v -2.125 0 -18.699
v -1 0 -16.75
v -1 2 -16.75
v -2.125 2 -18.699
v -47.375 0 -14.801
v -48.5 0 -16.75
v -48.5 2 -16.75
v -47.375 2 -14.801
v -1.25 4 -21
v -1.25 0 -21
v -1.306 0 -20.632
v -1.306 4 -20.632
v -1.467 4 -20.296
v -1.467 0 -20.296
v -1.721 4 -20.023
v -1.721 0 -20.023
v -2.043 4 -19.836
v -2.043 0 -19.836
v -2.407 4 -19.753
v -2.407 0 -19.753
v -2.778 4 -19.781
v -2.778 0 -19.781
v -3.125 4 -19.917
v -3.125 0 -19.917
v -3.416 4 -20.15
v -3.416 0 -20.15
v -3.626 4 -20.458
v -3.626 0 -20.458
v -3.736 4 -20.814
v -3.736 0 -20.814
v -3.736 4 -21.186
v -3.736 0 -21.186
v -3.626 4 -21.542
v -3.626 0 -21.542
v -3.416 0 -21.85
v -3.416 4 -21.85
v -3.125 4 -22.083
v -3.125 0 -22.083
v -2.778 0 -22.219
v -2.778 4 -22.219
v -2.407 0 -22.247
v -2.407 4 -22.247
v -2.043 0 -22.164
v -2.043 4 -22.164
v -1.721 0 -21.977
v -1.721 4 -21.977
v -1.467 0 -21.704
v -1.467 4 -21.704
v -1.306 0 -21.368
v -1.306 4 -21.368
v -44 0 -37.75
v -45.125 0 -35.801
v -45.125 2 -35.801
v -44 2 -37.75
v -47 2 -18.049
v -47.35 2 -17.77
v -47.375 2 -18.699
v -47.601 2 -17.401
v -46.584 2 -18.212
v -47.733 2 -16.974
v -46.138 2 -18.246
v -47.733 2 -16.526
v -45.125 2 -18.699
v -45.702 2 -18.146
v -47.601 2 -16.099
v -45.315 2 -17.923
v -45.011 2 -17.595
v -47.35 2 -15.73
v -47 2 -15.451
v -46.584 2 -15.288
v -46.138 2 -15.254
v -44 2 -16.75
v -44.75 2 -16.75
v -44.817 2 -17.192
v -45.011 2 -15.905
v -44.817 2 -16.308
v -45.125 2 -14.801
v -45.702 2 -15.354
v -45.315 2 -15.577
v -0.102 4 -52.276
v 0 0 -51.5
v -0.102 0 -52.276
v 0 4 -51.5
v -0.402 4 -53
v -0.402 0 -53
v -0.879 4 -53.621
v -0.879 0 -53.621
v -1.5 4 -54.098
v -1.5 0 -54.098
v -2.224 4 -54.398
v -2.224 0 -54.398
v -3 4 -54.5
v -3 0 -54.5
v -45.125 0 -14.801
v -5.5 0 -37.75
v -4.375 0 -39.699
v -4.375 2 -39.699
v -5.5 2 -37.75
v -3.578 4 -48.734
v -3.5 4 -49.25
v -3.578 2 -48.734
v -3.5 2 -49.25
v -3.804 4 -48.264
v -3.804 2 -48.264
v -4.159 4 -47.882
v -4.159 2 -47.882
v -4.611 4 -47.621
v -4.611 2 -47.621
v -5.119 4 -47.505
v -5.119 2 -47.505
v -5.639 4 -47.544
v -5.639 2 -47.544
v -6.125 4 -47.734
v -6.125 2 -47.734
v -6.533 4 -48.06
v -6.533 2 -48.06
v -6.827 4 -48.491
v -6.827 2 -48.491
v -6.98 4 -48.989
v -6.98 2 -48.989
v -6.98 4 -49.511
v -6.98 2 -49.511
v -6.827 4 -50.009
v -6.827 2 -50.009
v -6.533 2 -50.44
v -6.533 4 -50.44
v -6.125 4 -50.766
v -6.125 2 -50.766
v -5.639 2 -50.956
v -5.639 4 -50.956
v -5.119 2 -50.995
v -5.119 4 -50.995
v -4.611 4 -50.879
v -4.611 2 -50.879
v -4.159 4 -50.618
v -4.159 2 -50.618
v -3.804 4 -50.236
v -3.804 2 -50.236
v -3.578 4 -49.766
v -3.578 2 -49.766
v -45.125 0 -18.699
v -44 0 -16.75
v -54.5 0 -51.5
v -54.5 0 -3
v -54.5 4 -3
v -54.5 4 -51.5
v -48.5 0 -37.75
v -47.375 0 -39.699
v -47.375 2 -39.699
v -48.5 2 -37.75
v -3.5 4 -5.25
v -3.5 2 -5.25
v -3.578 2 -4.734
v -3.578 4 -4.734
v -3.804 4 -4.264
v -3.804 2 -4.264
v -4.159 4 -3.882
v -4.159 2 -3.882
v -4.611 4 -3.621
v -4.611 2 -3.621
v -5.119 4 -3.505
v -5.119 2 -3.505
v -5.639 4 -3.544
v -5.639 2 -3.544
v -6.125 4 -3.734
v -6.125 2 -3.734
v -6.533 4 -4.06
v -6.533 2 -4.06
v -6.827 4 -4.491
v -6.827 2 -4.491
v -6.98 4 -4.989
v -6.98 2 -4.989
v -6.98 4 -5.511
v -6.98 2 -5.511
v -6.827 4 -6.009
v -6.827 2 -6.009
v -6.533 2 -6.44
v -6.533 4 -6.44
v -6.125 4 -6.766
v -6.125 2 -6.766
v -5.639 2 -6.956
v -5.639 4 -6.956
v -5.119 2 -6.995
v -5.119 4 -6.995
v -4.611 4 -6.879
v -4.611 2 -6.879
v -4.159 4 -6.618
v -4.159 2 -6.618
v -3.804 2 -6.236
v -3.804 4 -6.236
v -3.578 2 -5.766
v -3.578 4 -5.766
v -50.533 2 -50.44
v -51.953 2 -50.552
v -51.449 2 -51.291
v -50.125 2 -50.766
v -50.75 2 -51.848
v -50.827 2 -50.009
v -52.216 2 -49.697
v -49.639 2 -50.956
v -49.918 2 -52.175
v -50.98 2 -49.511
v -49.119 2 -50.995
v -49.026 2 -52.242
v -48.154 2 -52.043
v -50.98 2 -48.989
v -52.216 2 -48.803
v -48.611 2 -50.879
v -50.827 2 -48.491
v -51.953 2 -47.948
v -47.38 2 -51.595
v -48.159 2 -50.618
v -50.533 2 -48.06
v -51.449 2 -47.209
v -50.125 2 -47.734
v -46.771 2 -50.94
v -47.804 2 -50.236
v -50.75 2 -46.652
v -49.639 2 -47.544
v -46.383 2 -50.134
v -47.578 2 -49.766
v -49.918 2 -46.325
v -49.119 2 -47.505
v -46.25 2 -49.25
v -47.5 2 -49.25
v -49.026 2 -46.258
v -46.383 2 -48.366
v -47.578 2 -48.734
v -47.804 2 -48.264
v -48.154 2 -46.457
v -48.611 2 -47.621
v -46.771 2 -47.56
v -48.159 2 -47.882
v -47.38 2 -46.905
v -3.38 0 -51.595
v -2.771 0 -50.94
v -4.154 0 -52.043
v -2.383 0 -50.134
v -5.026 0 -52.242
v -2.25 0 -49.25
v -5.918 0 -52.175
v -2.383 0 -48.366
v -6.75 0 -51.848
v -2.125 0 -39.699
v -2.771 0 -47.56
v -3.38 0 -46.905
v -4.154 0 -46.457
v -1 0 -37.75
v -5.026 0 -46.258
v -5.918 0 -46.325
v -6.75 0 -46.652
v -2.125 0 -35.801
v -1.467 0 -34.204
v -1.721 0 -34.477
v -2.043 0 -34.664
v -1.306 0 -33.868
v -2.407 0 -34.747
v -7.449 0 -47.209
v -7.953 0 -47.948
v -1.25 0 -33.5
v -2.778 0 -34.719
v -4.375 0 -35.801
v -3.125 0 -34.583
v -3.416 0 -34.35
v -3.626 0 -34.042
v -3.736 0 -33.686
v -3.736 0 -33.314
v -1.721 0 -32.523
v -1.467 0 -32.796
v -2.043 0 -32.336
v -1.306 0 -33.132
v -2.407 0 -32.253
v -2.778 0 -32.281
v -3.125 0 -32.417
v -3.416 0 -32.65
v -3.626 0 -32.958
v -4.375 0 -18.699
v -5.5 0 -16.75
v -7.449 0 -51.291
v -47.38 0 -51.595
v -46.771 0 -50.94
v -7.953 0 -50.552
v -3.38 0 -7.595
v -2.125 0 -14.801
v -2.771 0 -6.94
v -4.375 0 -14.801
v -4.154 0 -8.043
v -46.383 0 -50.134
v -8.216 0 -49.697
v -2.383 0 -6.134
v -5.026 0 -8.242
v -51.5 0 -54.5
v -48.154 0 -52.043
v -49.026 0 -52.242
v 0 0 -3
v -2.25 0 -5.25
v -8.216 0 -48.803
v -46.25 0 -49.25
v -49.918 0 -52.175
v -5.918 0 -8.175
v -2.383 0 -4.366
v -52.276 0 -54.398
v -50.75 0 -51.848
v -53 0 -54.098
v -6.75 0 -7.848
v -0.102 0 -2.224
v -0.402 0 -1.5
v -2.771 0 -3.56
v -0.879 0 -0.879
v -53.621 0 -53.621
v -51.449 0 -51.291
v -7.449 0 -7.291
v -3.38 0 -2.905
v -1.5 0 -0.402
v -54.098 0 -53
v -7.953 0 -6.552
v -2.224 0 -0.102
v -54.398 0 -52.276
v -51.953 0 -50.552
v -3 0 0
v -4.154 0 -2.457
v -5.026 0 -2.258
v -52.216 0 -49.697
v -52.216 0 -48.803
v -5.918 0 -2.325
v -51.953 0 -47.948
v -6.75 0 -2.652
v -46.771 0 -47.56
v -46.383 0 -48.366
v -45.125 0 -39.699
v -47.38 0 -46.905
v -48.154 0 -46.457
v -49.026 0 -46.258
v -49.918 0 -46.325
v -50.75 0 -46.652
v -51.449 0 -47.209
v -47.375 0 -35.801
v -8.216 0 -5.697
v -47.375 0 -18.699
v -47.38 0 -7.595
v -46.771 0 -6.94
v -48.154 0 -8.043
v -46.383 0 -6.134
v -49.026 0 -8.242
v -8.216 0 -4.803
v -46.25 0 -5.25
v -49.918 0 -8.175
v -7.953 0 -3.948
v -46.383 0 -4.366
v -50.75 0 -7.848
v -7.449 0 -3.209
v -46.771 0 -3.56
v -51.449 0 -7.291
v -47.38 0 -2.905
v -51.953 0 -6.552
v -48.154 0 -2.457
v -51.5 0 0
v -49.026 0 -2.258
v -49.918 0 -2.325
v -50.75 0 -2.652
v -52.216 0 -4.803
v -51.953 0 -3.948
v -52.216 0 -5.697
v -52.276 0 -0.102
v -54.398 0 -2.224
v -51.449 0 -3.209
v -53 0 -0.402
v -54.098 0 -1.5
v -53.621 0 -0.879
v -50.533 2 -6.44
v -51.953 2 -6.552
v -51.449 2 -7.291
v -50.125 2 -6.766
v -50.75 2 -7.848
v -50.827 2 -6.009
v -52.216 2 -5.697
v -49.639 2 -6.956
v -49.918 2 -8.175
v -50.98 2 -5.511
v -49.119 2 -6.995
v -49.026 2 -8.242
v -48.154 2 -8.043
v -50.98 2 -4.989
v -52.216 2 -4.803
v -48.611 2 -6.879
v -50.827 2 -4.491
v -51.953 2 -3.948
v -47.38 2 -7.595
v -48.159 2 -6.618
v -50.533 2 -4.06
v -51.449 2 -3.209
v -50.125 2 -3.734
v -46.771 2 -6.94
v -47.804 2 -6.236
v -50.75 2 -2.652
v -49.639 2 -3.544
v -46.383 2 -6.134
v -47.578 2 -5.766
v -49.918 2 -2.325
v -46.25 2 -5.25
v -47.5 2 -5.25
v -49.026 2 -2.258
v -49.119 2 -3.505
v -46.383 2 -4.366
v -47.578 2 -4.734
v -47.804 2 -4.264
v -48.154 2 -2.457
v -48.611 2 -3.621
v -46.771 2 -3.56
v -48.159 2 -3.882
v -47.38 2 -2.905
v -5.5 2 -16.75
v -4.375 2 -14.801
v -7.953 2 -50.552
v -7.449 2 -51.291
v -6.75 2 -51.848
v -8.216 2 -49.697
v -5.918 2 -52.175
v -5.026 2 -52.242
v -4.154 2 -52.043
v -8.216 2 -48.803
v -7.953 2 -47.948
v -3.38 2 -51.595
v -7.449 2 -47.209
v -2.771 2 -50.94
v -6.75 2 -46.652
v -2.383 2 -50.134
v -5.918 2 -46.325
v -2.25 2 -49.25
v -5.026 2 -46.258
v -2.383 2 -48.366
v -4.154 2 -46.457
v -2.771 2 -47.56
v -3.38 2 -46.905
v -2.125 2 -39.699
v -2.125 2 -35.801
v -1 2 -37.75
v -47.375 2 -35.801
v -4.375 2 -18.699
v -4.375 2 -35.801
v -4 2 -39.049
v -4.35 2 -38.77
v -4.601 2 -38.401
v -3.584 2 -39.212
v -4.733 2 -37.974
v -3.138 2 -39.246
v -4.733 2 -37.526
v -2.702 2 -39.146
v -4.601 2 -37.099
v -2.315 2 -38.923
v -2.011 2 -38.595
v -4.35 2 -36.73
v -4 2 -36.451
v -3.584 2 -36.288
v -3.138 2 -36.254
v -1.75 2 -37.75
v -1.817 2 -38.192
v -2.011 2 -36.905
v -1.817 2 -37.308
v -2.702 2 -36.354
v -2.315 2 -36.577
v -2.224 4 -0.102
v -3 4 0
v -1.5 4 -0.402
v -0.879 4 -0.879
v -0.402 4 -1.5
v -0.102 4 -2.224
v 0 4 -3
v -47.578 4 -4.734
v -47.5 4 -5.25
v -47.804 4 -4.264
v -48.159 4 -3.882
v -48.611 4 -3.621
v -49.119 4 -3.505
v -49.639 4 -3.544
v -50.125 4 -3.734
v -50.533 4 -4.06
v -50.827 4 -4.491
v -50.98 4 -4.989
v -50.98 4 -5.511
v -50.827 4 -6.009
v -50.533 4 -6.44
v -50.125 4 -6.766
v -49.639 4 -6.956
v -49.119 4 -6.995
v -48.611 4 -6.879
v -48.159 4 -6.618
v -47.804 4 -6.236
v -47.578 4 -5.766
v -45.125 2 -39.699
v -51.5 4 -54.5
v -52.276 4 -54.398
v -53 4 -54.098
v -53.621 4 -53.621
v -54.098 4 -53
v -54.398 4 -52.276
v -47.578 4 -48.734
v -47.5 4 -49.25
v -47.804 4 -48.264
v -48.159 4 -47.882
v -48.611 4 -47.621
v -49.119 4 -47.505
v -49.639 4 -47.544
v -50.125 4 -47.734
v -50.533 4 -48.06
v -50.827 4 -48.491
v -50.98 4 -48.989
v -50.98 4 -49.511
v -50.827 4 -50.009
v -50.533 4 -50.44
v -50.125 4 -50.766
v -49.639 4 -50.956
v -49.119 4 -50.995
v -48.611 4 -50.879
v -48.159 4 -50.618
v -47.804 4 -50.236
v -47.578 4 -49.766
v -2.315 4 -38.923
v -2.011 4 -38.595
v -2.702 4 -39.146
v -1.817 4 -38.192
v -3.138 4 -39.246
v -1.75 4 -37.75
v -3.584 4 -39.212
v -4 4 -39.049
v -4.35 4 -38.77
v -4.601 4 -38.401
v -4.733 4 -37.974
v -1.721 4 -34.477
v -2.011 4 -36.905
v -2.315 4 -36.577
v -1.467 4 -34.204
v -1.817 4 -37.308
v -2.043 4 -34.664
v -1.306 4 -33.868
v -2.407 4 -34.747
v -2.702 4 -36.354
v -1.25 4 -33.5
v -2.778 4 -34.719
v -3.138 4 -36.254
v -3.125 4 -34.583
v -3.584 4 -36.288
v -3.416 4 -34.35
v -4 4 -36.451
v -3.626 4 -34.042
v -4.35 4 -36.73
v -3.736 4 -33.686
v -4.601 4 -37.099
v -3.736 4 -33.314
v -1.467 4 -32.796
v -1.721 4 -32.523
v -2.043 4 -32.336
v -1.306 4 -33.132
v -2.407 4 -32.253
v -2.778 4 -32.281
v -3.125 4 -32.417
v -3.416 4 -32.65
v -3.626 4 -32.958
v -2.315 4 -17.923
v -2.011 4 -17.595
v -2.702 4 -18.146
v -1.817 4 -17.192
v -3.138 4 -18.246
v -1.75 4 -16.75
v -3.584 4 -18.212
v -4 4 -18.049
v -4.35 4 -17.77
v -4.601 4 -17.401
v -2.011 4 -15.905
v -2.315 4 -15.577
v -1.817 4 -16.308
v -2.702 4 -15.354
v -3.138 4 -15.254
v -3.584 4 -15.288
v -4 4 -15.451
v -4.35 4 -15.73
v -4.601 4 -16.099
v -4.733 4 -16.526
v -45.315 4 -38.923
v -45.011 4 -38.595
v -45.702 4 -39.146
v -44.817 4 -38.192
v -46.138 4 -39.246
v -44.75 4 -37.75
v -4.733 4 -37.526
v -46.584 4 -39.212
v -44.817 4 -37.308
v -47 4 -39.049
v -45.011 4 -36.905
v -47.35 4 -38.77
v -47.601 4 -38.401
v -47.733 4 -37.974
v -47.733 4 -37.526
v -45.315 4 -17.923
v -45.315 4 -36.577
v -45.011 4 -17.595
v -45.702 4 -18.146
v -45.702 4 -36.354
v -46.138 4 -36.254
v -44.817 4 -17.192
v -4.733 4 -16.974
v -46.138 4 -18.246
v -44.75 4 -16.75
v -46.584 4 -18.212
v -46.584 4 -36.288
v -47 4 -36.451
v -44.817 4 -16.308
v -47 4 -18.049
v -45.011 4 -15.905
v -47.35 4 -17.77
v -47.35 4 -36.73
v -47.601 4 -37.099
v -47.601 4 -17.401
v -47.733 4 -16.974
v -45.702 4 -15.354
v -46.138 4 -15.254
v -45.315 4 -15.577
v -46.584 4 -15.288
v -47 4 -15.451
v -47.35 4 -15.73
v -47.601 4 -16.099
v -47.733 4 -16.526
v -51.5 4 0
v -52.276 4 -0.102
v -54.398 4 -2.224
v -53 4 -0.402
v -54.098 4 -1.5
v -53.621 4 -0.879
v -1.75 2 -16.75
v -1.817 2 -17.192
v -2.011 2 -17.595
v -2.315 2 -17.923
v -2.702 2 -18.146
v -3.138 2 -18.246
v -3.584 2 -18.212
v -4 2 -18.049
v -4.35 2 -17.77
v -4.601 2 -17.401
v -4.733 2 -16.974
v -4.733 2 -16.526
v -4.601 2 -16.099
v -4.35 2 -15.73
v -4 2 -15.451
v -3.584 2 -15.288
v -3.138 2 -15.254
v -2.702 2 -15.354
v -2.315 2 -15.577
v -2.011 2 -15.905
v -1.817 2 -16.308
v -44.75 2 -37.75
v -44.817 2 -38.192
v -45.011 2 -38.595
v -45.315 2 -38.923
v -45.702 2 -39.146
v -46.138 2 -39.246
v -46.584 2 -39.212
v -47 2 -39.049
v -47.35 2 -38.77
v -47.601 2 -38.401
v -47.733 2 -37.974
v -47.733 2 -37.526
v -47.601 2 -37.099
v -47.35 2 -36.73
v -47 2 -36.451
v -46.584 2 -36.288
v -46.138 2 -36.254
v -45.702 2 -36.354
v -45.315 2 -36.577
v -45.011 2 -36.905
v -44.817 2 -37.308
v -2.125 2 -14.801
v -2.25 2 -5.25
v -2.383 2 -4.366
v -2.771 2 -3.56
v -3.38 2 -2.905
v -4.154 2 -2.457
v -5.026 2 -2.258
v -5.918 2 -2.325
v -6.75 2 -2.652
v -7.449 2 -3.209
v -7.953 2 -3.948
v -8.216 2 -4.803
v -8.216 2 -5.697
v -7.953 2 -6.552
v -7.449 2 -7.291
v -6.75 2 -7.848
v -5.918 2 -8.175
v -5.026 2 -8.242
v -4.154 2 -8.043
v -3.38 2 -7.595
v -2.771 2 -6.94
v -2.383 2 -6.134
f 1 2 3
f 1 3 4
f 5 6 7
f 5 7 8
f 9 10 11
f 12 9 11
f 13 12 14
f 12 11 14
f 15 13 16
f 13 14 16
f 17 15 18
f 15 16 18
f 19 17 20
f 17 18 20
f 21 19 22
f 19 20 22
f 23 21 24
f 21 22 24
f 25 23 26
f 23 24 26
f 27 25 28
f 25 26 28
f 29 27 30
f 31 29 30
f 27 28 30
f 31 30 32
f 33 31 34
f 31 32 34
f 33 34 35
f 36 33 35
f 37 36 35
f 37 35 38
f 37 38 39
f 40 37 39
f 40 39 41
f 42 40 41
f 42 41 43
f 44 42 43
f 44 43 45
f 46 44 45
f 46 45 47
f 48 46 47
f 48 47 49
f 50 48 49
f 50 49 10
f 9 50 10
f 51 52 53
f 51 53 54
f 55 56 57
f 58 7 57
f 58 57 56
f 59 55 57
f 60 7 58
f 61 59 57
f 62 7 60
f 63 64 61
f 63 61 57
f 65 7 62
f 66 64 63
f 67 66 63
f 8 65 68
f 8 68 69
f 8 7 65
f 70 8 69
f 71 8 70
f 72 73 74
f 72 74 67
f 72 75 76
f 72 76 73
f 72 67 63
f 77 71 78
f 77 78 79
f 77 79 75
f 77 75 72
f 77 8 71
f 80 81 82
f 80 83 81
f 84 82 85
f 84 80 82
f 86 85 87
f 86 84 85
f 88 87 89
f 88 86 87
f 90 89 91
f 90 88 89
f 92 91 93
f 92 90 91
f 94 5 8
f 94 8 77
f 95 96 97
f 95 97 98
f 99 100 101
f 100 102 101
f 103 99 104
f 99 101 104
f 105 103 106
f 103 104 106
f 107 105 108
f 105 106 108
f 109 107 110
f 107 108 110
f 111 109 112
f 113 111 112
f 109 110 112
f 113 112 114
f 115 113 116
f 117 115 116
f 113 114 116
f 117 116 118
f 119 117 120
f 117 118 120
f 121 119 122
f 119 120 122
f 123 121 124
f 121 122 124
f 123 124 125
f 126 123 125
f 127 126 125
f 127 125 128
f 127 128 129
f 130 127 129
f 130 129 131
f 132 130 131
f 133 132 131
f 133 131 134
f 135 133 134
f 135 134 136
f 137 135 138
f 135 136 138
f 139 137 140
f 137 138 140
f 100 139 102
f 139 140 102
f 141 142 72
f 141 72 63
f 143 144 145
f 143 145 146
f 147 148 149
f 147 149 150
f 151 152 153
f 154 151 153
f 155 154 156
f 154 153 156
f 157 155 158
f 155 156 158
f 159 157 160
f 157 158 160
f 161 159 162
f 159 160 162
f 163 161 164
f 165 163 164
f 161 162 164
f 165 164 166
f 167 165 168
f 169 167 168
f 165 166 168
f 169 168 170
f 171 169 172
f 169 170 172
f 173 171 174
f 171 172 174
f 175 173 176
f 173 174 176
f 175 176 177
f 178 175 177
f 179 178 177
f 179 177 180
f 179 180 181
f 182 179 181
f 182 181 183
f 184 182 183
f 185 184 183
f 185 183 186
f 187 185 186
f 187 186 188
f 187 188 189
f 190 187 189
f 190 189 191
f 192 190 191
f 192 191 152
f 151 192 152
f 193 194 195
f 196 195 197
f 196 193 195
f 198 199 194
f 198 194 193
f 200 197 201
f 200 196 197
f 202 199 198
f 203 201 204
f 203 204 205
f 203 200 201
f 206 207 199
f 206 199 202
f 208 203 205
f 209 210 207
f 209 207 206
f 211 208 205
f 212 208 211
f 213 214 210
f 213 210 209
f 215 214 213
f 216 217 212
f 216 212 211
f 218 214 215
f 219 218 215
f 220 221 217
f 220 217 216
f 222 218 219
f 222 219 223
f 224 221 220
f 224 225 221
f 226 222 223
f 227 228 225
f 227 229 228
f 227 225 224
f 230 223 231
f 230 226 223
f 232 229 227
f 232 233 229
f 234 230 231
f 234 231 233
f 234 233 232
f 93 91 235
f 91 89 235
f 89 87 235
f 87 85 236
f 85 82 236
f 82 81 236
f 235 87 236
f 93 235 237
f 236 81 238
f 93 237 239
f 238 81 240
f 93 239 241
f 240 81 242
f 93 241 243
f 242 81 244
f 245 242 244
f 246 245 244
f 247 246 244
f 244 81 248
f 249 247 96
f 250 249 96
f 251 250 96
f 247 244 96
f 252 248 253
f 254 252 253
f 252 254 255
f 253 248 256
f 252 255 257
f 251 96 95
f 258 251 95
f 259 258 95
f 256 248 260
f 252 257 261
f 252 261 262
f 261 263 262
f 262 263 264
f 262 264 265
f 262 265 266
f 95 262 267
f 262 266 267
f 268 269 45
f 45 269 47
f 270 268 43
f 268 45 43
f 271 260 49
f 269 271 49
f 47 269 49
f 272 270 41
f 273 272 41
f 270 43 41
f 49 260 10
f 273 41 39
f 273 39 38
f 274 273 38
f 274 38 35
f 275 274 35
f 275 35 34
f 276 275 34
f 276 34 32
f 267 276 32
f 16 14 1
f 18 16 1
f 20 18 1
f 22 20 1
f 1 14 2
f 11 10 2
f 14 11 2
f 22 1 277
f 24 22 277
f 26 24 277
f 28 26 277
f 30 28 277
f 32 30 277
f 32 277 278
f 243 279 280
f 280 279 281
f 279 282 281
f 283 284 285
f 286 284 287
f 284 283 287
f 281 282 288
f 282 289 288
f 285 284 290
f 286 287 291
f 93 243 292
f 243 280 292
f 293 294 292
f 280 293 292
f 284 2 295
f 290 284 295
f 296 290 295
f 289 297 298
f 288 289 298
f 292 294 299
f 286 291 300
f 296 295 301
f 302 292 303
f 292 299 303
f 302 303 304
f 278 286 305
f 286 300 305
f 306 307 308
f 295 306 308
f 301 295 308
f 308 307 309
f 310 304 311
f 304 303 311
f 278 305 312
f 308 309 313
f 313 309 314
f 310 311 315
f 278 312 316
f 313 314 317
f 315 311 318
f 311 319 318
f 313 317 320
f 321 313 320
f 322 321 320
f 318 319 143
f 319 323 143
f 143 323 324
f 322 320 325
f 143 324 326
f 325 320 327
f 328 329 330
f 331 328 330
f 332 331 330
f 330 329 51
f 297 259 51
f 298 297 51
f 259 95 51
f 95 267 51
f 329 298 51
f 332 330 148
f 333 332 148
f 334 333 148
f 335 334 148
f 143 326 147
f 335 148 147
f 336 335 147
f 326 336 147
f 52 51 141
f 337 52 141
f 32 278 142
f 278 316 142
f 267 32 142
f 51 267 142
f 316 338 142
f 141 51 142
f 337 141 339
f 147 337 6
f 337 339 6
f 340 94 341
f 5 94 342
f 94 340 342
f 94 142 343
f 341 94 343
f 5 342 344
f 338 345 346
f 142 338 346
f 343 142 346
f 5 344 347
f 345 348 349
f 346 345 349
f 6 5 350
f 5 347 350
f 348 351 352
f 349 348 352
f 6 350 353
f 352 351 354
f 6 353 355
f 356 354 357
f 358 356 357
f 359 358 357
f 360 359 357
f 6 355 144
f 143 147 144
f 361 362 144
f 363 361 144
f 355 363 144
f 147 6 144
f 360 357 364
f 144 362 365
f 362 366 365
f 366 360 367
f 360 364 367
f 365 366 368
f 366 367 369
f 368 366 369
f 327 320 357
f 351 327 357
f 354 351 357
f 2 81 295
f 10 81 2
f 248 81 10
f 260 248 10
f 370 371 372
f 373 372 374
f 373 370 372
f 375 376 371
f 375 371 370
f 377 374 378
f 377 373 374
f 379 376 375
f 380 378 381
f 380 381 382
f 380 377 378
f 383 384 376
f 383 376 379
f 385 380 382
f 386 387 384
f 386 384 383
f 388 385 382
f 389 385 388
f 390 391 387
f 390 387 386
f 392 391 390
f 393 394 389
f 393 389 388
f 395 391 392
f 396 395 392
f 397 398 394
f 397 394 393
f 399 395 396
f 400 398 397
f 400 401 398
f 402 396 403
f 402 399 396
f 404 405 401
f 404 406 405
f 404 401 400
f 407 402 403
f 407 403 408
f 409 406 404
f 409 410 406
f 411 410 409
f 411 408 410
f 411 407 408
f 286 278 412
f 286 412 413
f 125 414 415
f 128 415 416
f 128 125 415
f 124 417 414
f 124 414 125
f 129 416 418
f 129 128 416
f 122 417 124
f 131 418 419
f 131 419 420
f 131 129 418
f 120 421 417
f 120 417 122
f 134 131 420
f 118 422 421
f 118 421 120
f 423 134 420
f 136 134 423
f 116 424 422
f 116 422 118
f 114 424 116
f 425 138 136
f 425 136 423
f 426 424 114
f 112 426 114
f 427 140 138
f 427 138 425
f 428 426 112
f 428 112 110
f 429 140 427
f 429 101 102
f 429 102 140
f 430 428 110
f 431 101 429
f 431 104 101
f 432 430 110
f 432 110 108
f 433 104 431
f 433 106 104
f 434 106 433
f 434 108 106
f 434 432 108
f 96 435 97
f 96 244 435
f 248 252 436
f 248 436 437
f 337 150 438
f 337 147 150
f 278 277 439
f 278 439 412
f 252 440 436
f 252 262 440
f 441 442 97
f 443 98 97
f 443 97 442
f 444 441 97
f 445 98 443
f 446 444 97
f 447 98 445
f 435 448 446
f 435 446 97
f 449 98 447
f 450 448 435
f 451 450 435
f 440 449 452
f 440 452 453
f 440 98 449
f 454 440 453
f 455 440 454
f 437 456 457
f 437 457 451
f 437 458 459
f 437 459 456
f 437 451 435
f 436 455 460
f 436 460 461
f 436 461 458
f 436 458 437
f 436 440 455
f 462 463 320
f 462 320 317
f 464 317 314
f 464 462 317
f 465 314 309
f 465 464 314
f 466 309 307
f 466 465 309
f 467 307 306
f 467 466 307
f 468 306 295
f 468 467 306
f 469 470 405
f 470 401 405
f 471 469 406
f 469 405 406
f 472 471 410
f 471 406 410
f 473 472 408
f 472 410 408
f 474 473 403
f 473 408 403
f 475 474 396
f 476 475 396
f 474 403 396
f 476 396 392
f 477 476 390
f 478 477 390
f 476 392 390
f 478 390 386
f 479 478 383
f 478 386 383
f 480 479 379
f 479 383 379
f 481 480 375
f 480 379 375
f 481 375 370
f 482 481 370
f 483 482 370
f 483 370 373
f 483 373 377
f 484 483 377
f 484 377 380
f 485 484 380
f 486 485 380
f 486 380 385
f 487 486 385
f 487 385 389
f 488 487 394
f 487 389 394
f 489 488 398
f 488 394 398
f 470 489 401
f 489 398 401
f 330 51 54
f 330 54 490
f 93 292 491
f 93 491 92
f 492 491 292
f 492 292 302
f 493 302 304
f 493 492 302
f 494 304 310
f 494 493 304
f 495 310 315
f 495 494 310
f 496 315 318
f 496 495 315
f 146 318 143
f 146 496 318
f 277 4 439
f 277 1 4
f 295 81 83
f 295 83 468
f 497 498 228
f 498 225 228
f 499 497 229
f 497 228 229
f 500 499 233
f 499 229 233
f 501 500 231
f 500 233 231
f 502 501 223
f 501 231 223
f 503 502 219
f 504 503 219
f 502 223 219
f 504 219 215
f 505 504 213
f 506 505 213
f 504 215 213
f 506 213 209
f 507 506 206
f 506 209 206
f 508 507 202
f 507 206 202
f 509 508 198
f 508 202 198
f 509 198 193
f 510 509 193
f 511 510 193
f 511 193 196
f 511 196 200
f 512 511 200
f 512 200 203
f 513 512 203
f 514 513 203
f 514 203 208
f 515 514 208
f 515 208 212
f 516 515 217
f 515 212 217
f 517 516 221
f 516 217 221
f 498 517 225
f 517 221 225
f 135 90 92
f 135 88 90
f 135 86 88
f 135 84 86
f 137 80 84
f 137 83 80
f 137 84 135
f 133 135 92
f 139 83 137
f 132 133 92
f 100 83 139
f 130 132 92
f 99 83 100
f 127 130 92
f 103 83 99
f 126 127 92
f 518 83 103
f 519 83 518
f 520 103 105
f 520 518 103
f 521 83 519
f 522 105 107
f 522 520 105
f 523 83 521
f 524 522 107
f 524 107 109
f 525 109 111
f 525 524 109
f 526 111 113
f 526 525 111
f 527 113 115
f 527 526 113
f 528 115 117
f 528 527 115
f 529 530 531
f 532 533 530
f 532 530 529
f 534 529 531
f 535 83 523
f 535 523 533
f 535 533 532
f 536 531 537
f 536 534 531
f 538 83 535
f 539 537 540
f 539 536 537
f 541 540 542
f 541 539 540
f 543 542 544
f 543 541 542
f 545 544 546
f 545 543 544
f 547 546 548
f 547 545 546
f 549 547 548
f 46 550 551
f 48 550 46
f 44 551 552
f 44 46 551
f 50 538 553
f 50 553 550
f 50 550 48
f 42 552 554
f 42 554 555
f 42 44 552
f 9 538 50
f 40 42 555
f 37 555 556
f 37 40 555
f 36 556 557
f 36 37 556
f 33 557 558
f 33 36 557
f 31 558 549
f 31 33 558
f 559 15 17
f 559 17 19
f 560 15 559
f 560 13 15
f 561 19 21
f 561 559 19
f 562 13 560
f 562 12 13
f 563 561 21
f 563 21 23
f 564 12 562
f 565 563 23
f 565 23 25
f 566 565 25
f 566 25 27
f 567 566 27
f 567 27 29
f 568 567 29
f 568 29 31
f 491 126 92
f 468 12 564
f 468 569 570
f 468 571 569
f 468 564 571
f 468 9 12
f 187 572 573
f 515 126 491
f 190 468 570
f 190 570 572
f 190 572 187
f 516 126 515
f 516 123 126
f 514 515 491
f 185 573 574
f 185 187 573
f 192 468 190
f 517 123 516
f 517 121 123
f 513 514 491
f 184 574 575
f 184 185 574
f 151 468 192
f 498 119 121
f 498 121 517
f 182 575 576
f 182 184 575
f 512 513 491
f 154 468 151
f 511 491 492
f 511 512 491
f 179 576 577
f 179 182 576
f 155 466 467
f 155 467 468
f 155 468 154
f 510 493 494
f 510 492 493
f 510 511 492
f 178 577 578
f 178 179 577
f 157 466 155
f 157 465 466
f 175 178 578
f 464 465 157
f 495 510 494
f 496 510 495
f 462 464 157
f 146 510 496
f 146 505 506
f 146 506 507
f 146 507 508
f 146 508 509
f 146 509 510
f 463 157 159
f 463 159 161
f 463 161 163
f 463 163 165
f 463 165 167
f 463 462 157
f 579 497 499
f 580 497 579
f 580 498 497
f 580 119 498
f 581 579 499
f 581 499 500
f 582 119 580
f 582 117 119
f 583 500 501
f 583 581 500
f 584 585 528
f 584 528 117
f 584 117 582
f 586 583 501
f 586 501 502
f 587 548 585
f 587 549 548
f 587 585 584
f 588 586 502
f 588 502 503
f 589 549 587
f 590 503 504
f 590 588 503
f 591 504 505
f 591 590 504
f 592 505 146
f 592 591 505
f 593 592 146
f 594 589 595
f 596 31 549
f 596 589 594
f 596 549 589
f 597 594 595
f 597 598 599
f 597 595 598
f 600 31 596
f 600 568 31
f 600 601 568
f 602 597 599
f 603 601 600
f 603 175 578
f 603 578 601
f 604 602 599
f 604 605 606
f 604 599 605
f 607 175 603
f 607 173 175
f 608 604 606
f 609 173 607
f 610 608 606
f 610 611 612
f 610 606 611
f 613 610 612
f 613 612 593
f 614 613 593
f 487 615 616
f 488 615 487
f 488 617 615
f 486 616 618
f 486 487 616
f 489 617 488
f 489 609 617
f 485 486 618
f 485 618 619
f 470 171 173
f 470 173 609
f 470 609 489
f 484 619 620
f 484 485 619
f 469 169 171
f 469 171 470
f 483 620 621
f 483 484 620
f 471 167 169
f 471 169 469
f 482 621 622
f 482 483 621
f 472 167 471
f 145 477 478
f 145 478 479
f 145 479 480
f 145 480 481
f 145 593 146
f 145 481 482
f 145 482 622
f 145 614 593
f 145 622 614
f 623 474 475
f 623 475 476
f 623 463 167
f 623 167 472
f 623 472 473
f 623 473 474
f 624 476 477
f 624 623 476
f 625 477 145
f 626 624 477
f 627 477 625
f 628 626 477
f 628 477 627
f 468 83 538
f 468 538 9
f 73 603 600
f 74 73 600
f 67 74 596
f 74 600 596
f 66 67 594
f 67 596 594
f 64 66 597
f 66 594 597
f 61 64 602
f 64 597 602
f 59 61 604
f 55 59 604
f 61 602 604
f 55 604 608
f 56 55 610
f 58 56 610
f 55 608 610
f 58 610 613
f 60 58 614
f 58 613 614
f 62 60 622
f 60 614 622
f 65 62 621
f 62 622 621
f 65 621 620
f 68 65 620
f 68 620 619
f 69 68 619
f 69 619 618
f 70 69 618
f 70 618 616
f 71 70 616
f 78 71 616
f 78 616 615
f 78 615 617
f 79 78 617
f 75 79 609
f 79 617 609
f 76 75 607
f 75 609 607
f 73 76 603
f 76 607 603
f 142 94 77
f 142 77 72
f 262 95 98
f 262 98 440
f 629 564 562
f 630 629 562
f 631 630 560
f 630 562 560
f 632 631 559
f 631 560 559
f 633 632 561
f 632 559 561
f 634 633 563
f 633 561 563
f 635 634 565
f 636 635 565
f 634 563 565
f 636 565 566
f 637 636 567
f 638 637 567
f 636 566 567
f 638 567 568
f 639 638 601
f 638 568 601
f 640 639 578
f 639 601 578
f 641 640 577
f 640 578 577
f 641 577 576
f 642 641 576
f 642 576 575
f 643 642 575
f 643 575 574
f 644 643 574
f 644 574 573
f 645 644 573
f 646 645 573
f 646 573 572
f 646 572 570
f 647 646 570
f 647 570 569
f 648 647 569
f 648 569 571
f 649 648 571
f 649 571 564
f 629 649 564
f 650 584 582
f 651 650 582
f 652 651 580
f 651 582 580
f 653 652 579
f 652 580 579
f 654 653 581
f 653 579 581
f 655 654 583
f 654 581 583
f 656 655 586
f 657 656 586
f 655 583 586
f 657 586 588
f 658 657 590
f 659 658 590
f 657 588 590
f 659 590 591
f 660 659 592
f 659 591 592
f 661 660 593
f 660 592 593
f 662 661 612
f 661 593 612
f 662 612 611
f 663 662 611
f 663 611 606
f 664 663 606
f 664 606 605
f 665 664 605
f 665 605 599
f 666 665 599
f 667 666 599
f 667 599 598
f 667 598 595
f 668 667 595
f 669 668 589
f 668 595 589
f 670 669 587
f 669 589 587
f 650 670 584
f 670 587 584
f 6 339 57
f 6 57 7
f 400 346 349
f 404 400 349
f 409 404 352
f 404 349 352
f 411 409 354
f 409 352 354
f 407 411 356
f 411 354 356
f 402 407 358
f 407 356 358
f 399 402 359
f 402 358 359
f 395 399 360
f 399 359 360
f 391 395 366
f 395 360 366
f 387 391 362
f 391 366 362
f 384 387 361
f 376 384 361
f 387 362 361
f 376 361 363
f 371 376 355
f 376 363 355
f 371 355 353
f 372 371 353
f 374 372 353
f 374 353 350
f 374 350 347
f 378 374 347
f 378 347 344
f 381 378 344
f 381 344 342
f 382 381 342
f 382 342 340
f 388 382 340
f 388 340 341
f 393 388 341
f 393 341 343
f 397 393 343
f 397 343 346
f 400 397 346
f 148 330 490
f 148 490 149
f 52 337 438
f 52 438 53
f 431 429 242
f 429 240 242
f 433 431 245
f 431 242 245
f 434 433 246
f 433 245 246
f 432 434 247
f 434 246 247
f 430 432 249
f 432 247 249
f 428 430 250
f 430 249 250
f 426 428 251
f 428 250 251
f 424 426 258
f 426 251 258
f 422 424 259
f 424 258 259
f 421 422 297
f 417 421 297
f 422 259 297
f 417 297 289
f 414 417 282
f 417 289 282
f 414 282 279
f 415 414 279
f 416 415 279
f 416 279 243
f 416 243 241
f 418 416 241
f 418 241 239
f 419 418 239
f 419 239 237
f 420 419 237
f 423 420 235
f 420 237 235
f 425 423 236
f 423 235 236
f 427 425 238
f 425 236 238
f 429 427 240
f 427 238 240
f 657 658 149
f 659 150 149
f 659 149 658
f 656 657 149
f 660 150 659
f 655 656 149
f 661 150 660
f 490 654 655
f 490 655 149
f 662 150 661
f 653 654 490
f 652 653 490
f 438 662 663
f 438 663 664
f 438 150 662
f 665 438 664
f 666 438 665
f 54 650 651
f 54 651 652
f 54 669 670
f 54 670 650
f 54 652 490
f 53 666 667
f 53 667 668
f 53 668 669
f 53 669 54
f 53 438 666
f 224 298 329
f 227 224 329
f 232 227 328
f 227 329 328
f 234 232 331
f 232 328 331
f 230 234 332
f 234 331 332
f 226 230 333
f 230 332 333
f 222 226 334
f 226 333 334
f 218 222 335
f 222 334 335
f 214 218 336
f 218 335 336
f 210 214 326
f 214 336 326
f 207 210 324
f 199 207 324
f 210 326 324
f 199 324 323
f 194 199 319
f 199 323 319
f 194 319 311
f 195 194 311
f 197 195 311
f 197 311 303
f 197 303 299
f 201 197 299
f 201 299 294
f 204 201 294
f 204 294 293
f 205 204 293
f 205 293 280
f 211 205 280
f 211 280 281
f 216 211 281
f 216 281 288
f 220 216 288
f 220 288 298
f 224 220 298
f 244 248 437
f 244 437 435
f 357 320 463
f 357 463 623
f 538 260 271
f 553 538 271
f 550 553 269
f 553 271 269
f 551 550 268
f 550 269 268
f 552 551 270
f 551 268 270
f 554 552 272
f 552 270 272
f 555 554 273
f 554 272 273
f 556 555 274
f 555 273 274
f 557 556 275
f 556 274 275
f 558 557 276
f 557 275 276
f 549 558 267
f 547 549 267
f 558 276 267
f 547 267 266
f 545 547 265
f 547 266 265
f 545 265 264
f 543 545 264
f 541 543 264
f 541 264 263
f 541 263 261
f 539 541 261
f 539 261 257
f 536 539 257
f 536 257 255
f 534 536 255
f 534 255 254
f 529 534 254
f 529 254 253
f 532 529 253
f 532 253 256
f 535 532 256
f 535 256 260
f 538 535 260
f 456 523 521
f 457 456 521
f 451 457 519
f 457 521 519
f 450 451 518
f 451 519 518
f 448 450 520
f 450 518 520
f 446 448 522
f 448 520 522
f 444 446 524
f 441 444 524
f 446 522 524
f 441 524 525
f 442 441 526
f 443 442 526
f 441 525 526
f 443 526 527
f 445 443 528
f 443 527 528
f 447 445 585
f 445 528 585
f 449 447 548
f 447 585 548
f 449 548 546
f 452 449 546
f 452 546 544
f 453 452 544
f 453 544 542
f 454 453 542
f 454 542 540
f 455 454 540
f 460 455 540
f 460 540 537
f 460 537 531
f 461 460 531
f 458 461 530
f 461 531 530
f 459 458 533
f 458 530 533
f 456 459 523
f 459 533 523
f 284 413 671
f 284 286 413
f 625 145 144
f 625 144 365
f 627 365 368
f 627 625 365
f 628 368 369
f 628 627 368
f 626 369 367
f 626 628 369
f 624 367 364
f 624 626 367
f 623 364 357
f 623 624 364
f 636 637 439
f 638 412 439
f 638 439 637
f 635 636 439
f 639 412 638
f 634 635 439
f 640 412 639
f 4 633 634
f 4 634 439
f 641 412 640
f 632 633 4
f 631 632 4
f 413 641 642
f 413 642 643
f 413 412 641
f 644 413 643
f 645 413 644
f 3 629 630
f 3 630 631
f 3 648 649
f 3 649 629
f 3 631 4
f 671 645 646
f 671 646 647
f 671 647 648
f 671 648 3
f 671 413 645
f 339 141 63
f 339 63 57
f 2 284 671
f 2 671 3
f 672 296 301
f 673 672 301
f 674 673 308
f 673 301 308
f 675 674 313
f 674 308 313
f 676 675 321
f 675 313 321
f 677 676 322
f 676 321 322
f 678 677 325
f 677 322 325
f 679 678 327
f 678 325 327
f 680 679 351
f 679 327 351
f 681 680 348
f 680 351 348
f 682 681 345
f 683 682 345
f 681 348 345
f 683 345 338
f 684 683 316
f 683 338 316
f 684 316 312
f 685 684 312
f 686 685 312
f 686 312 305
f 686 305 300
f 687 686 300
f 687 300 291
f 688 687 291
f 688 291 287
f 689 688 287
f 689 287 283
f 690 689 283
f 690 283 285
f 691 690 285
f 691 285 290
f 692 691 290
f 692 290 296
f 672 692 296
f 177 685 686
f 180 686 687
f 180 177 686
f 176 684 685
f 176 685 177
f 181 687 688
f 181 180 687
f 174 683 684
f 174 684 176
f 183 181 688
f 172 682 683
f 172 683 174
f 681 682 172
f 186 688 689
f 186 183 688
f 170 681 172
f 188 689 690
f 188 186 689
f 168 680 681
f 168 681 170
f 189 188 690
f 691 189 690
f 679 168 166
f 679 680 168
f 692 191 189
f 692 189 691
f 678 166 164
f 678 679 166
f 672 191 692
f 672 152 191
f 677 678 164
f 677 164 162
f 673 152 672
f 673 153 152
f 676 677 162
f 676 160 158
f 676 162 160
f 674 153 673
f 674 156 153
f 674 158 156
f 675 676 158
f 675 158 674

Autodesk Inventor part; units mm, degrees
ref_plane "YZ Plane" through (0, 0, 0) normal (1, 0, 0) x (0, 1, 0)
ref_plane "XZ Plane" through (0, 0, 0) normal (0, 1, 0) x (-1, 0, 0)
ref_plane "XY Plane" through (0, 0, 0) normal (0, 0, 1) x (1, 0, 0)
sketch "Эскиз1" plane through (0, 0, 0) normal (0, 1, 0) x (-1, 0, 0)
  line L0 (0, 0) -> (54.5, 0)
  line L1 (54.5, 0) -> (54.5, -54.5)
  line L2 (54.5, -54.5) -> (0, -54.5)
  line L3 (0, -54.5) -> (0, 0)
  dimension "d0" = 54.5
  dimension "d1" = 54.5
extrude "Выдавливание1" add sketch "Эскиз1" along normal blind 4
fillet "Сопряжение1" radius 3 4 edges at (0, 2, 0) (0, 2, -54.5) (-54.5, 2, -54.5) (-54.5, 2, 0)
sketch "Эскиз2" plane through (0, 0, 0) normal (0, -1, 0) x (1, 0, 0)
  arc A0 (-54.5, -51.5) -> (-51.5, -54.5) centre (-51.5, -51.5) ccw projected
  line L0 (-54.5, -51.5) -> (-54.5, -3) projected
  line L1 (-54.5, -27.25) -> (0, -27.25) construction
  line L2 (0, -3) -> (0, -51.5) projected
  line L3 (-3, -54.5) -> (-51.5, -54.5) projected
  line L4 (-27.25, -54.5) -> (-27.25, 0) construction
  line L5 (-51.5, 0) -> (-3, 0) projected
  line L6 (-54.5, -51.5) -> (-54.5, -3) projected
  circle A1 centre (-49.25, -49.25) radius 3
  circle A2 centre (-49.25, -5.25) radius 3
  circle A3 centre (-5.25, -49.25) radius 3
  circle A4 centre (-5.25, -5.25) radius 3
  point P0 (0, 0)
  dimension "d13" = 6
  dimension "d34" = 44
  dimension "d35" = 44
extrude "Выдавливание2" cut sketch "Эскиз2" against normal blind 2
sketch "Эскиз3" plane through (0, 2, 0) normal (0, -1, 0) x (1, 0, 0)
  circle A0 centre (-49.25, -49.25) radius 1.75
  line L0 (-54.5, -51.5) -> (-54.5, -3) projected
  line L1 (-54.5, -27.25) -> (0, -27.25) construction
  line L2 (0, -3) -> (0, -51.5) projected
  line L3 (-3, -54.5) -> (-51.5, -54.5) projected
  line L4 (-27.25, -54.5) -> (-27.25, 0) construction
  line L5 (-51.5, 0) -> (-3, 0) projected
  circle A1 centre (-49.25, -5.25) radius 1.75
  circle A2 centre (-5.25, -49.25) radius 1.75
  circle A3 centre (-5.25, -5.25) radius 1.75
  circle A4 centre (-49.25, -49.25) radius 3 construction
  circle A5 centre (-49.25, -49.25) radius 3
  point P0 (0, 0)
  point P1 (-45.0293, -48.6853)
  point P2 (-51.4707, -47.8147)
  dimension "d9" = 3.5
extrude "Выдавливание3" cut sketch "Эскиз3" against normal blind 2 contours A0 | A1 | A2 | A3
sketch "Эскиз4" plane through (0, 4, 0) normal (0, 1, 0) x (1, 0, 0)
  line L0 (-54.5, 51.5) -> (-54.5, 3) projected
  line L1 (0, 3) -> (0, 51.5) construction
  line L2 (-51.5, 0) -> (-3, 0) projected
  line L3 (-3, 54.5) -> (-51.5, 54.5) projected
  line L4 (-49.5, 14.5) -> (0, 14.5) construction
  line L5 (0, 14.5) -> (0, 40) construction
  line L6 (0, 40) -> (-49.5, 40) construction
  line L7 (-49.5, 40) -> (-49.5, 14.5) construction
  line L8 (-46.25, 16.75) -> (-3.25, 16.75) construction
  line L9 (-3.25, 16.75) -> (-3.25, 37.75) construction
  line L10 (-3.25, 37.75) -> (-46.25, 37.75) construction
  line L11 (-46.25, 37.75) -> (-46.25, 16.75) construction
  line L12 (-24.75, 14.5) -> (-24.75, 40) construction
  line L13 (0, 27.25) -> (-24.75, 27.25) construction
  line L14 (-24.75, 16.75) -> (-24.75, 37.75) construction
  line L15 (-3.25, 27.25) -> (-24.75, 27.25) construction
  circle A0 centre (-46.25, 16.75) radius 1.5
  circle A1 centre (-46.25, 37.75) radius 1.5
  circle A2 centre (-3.25, 37.75) radius 1.5
  circle A3 centre (-3.25, 16.75) radius 1.5
  line L16 (-27.25, 27.25) -> (-21.7344, 27.25) construction
  point P0 (0, 0)
  dimension "d17" = 49.5
  dimension "d18" = 25.5
  dimension "d19" = 43
  dimension "d20" = 21
  dimension "d21" = 3
  dimension "d22" = 3
  dimension "d23" = 3
  dimension "d24" = 3
  dimension "d36" = 2.25
  dimension "d37" = 3.25
  dimension "d40" = 3.25
  dimension "d41" = 2.25
  dimension "d42" = 2.25
  dimension "d43" = 3.25
  dimension "d44" = 3.25
  dimension "d45" = 2.25
extrude "Выдавливание4" cut sketch "Эскиз4" against normal blind 4
sketch "Эскиз5" plane through (0, 0, 0) normal (0, -1, 0) x (1, 0, 0)
  circle A0 centre (-3.25, -16.75) radius 1.5 projected
  circle A1 centre (-3.25, -16.75) radius 2.25 construction
  line L0 (-1, -16.75) -> (-2.125, -18.6986)
  line L1 (-2.125, -18.6986) -> (-4.375, -18.6986)
  line L2 (-4.375, -18.6986) -> (-5.5, -16.75)
  line L3 (-5.5, -16.75) -> (-4.375, -14.8014)
  line L4 (-4.375, -14.8014) -> (-2.125, -14.8014)
  line L5 (-2.125, -14.8014) -> (-1, -16.75)
  circle A2 centre (-3.25, -37.75) radius 1.5 projected
  circle A3 centre (-3.25, -37.75) radius 1.5
  circle A4 centre (-46.25, -37.75) radius 1.5 projected
  circle A5 centre (-46.25, -37.75) radius 1.5
  circle A6 centre (-46.25, -16.75) radius 1.5 projected
  circle A7 centre (-46.25, -16.75) radius 1.5
  line L6 (-1, -37.75) -> (-2.125, -39.6986)
  line L7 (-2.125, -39.6986) -> (-4.375, -39.6986)
  line L8 (-4.375, -39.6986) -> (-5.5, -37.75)
  line L9 (-5.5, -37.75) -> (-4.375, -35.8014)
  line L10 (-4.375, -35.8014) -> (-2.125, -35.8014)
  line L11 (-2.125, -35.8014) -> (-1, -37.75)
  line L12 (-44, -37.75) -> (-45.125, -39.6986)
  line L13 (-45.125, -39.6986) -> (-47.375, -39.6986)
  line L14 (-47.375, -39.6986) -> (-48.5, -37.75)
  line L15 (-48.5, -37.75) -> (-47.375, -35.8014)
  line L16 (-47.375, -35.8014) -> (-45.125, -35.8014)
  line L17 (-45.125, -35.8014) -> (-44, -37.75)
  line L18 (-44, -16.75) -> (-45.125, -18.6986)
  line L19 (-45.125, -18.6986) -> (-47.375, -18.6986)
  line L20 (-47.375, -18.6986) -> (-48.5, -16.75)
  line L21 (-48.5, -16.75) -> (-47.375, -14.8014)
  line L22 (-47.375, -14.8014) -> (-45.125, -14.8014)
  line L23 (-45.125, -14.8014) -> (-44, -16.75)
  line L24 (-44, -16.75) -> (-48.5, -16.75) construction
  line L25 (-44, -37.75) -> (-48.5, -37.75) construction
  line L26 (-1, -37.75) -> (-5.5, -37.75) construction
  line L27 (-1, -16.75) -> (-5.5, -16.75) construction
  point P0 (0, 0)
  dimension "d27" = 4.5
extrude "Выдавливание5" cut sketch "Эскиз5" against normal blind 2 contours A0 | L0 L1 L2 L3 L4 L5 | A2 | A4 | A6 | L6 L7 L8 L9 L10 L11 | L12 L13 L14 L15 L16 L17 | L18 L19 L20 L21 L22 L23
sketch "Эскиз6" plane through (0, 0, 0) normal (0, -1, 0) x (1, 0, 0)
  circle A0 centre (-2.5, -33.5) radius 1.25
  line L0 (-2.5, -33.5) -> (-2.5, -21) construction
  circle A1 centre (-2.5, -21) radius 1.25
  line L1 (0, -3) -> (0, -51.5) projected
  line L2 (0, -3) -> (0, -51.5) projected
  line L3 (0, -27.25) -> (-19.5358, -27.25) construction
  point P0 (0, 0)
  point P1 (-2.5, -27.25)
  dimension "d46" = 2.5
  dimension "d47" = 12.5
  dimension "d48" = 2.5
  dimension "d49" = 2.5
extrude "Выдавливание6" cut sketch "Эскиз6" against normal blind 4
equation "\"d0\" = d1"
equation "\"d22\" = d21"
equation "\"d23\" = d21"
equation "\"d24\" = d21"
equation "\"d36\" = d42"
equation "\"d37\" = d43"
equation "\"d40\" = d43"
equation "\"d41\" = d42"
equation "\"d44\" = d43"
equation "\"d45\" = d42"
properties part number "bottom"
